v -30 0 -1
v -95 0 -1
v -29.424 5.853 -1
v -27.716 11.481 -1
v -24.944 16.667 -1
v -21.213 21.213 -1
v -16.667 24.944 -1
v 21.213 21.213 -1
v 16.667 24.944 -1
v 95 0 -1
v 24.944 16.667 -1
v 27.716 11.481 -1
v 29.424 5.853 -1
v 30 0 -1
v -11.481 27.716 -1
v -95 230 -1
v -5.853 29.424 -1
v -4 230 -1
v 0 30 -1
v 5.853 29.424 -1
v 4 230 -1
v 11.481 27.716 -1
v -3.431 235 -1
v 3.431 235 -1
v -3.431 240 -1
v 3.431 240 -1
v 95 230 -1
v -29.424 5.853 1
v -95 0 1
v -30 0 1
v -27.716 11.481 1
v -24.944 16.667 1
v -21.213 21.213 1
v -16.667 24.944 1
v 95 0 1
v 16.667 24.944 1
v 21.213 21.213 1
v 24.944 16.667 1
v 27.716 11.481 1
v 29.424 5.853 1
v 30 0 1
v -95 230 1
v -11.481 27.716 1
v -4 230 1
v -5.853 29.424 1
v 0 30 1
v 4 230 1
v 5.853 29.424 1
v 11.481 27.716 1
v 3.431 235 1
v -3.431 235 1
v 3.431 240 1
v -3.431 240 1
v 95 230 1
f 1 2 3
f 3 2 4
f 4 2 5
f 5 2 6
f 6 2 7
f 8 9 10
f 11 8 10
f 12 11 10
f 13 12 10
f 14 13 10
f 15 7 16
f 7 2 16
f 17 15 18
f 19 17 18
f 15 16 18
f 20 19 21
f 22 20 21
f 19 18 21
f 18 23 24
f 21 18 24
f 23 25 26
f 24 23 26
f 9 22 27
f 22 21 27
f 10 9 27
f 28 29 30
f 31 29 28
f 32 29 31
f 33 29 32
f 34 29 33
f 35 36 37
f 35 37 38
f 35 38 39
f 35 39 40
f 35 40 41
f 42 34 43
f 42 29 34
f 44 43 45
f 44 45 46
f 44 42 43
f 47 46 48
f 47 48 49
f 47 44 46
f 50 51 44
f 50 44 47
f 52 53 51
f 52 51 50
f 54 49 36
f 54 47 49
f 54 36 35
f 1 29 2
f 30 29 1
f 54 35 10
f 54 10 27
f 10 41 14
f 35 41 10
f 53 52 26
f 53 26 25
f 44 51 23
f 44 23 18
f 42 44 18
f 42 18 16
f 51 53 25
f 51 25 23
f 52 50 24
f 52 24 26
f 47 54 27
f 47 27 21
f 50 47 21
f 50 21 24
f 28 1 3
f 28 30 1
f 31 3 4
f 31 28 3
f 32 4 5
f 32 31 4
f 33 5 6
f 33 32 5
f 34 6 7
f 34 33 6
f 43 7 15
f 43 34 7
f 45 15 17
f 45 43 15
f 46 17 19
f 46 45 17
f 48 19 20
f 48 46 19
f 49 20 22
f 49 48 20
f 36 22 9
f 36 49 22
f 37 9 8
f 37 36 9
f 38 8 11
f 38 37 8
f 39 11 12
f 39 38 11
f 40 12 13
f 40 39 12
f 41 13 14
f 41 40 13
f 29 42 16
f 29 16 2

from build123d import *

# Parameters (mm, degrees)
BOSS_EXTRUDE1_DEPTH = 1


with BuildPart() as part:
    # Sketch2 → Boss-Extrude1 (new, symmetric)
    with BuildSketch(Plane.XY):
        with BuildLine():
            Line((30, 0), (95, 0))
            Line((95, 0), (95, 230))
            Line((95, 230), (4, 230))
            Line((4, 230), (3.430566833, 235))
            Line((3.430566833, 235), (3.430566833, 240))
            Line((3.430566833, 240), (-3.430566833, 240))
            Line((-3.430566833, 240), (-3.430566833, 235))
            Line((-3.430566833, 235), (-4, 230))
            Line((-4, 230), (-95, 230))
            Line((-95, 230), (-95, 0))
            Line((-95, 0), (-30, 0))
            ThreePointArc((-30, 0), (0, 30), (30, 0))
        make_face()
    extrude(amount=BOSS_EXTRUDE1_DEPTH, both=True)


solid = part.part
